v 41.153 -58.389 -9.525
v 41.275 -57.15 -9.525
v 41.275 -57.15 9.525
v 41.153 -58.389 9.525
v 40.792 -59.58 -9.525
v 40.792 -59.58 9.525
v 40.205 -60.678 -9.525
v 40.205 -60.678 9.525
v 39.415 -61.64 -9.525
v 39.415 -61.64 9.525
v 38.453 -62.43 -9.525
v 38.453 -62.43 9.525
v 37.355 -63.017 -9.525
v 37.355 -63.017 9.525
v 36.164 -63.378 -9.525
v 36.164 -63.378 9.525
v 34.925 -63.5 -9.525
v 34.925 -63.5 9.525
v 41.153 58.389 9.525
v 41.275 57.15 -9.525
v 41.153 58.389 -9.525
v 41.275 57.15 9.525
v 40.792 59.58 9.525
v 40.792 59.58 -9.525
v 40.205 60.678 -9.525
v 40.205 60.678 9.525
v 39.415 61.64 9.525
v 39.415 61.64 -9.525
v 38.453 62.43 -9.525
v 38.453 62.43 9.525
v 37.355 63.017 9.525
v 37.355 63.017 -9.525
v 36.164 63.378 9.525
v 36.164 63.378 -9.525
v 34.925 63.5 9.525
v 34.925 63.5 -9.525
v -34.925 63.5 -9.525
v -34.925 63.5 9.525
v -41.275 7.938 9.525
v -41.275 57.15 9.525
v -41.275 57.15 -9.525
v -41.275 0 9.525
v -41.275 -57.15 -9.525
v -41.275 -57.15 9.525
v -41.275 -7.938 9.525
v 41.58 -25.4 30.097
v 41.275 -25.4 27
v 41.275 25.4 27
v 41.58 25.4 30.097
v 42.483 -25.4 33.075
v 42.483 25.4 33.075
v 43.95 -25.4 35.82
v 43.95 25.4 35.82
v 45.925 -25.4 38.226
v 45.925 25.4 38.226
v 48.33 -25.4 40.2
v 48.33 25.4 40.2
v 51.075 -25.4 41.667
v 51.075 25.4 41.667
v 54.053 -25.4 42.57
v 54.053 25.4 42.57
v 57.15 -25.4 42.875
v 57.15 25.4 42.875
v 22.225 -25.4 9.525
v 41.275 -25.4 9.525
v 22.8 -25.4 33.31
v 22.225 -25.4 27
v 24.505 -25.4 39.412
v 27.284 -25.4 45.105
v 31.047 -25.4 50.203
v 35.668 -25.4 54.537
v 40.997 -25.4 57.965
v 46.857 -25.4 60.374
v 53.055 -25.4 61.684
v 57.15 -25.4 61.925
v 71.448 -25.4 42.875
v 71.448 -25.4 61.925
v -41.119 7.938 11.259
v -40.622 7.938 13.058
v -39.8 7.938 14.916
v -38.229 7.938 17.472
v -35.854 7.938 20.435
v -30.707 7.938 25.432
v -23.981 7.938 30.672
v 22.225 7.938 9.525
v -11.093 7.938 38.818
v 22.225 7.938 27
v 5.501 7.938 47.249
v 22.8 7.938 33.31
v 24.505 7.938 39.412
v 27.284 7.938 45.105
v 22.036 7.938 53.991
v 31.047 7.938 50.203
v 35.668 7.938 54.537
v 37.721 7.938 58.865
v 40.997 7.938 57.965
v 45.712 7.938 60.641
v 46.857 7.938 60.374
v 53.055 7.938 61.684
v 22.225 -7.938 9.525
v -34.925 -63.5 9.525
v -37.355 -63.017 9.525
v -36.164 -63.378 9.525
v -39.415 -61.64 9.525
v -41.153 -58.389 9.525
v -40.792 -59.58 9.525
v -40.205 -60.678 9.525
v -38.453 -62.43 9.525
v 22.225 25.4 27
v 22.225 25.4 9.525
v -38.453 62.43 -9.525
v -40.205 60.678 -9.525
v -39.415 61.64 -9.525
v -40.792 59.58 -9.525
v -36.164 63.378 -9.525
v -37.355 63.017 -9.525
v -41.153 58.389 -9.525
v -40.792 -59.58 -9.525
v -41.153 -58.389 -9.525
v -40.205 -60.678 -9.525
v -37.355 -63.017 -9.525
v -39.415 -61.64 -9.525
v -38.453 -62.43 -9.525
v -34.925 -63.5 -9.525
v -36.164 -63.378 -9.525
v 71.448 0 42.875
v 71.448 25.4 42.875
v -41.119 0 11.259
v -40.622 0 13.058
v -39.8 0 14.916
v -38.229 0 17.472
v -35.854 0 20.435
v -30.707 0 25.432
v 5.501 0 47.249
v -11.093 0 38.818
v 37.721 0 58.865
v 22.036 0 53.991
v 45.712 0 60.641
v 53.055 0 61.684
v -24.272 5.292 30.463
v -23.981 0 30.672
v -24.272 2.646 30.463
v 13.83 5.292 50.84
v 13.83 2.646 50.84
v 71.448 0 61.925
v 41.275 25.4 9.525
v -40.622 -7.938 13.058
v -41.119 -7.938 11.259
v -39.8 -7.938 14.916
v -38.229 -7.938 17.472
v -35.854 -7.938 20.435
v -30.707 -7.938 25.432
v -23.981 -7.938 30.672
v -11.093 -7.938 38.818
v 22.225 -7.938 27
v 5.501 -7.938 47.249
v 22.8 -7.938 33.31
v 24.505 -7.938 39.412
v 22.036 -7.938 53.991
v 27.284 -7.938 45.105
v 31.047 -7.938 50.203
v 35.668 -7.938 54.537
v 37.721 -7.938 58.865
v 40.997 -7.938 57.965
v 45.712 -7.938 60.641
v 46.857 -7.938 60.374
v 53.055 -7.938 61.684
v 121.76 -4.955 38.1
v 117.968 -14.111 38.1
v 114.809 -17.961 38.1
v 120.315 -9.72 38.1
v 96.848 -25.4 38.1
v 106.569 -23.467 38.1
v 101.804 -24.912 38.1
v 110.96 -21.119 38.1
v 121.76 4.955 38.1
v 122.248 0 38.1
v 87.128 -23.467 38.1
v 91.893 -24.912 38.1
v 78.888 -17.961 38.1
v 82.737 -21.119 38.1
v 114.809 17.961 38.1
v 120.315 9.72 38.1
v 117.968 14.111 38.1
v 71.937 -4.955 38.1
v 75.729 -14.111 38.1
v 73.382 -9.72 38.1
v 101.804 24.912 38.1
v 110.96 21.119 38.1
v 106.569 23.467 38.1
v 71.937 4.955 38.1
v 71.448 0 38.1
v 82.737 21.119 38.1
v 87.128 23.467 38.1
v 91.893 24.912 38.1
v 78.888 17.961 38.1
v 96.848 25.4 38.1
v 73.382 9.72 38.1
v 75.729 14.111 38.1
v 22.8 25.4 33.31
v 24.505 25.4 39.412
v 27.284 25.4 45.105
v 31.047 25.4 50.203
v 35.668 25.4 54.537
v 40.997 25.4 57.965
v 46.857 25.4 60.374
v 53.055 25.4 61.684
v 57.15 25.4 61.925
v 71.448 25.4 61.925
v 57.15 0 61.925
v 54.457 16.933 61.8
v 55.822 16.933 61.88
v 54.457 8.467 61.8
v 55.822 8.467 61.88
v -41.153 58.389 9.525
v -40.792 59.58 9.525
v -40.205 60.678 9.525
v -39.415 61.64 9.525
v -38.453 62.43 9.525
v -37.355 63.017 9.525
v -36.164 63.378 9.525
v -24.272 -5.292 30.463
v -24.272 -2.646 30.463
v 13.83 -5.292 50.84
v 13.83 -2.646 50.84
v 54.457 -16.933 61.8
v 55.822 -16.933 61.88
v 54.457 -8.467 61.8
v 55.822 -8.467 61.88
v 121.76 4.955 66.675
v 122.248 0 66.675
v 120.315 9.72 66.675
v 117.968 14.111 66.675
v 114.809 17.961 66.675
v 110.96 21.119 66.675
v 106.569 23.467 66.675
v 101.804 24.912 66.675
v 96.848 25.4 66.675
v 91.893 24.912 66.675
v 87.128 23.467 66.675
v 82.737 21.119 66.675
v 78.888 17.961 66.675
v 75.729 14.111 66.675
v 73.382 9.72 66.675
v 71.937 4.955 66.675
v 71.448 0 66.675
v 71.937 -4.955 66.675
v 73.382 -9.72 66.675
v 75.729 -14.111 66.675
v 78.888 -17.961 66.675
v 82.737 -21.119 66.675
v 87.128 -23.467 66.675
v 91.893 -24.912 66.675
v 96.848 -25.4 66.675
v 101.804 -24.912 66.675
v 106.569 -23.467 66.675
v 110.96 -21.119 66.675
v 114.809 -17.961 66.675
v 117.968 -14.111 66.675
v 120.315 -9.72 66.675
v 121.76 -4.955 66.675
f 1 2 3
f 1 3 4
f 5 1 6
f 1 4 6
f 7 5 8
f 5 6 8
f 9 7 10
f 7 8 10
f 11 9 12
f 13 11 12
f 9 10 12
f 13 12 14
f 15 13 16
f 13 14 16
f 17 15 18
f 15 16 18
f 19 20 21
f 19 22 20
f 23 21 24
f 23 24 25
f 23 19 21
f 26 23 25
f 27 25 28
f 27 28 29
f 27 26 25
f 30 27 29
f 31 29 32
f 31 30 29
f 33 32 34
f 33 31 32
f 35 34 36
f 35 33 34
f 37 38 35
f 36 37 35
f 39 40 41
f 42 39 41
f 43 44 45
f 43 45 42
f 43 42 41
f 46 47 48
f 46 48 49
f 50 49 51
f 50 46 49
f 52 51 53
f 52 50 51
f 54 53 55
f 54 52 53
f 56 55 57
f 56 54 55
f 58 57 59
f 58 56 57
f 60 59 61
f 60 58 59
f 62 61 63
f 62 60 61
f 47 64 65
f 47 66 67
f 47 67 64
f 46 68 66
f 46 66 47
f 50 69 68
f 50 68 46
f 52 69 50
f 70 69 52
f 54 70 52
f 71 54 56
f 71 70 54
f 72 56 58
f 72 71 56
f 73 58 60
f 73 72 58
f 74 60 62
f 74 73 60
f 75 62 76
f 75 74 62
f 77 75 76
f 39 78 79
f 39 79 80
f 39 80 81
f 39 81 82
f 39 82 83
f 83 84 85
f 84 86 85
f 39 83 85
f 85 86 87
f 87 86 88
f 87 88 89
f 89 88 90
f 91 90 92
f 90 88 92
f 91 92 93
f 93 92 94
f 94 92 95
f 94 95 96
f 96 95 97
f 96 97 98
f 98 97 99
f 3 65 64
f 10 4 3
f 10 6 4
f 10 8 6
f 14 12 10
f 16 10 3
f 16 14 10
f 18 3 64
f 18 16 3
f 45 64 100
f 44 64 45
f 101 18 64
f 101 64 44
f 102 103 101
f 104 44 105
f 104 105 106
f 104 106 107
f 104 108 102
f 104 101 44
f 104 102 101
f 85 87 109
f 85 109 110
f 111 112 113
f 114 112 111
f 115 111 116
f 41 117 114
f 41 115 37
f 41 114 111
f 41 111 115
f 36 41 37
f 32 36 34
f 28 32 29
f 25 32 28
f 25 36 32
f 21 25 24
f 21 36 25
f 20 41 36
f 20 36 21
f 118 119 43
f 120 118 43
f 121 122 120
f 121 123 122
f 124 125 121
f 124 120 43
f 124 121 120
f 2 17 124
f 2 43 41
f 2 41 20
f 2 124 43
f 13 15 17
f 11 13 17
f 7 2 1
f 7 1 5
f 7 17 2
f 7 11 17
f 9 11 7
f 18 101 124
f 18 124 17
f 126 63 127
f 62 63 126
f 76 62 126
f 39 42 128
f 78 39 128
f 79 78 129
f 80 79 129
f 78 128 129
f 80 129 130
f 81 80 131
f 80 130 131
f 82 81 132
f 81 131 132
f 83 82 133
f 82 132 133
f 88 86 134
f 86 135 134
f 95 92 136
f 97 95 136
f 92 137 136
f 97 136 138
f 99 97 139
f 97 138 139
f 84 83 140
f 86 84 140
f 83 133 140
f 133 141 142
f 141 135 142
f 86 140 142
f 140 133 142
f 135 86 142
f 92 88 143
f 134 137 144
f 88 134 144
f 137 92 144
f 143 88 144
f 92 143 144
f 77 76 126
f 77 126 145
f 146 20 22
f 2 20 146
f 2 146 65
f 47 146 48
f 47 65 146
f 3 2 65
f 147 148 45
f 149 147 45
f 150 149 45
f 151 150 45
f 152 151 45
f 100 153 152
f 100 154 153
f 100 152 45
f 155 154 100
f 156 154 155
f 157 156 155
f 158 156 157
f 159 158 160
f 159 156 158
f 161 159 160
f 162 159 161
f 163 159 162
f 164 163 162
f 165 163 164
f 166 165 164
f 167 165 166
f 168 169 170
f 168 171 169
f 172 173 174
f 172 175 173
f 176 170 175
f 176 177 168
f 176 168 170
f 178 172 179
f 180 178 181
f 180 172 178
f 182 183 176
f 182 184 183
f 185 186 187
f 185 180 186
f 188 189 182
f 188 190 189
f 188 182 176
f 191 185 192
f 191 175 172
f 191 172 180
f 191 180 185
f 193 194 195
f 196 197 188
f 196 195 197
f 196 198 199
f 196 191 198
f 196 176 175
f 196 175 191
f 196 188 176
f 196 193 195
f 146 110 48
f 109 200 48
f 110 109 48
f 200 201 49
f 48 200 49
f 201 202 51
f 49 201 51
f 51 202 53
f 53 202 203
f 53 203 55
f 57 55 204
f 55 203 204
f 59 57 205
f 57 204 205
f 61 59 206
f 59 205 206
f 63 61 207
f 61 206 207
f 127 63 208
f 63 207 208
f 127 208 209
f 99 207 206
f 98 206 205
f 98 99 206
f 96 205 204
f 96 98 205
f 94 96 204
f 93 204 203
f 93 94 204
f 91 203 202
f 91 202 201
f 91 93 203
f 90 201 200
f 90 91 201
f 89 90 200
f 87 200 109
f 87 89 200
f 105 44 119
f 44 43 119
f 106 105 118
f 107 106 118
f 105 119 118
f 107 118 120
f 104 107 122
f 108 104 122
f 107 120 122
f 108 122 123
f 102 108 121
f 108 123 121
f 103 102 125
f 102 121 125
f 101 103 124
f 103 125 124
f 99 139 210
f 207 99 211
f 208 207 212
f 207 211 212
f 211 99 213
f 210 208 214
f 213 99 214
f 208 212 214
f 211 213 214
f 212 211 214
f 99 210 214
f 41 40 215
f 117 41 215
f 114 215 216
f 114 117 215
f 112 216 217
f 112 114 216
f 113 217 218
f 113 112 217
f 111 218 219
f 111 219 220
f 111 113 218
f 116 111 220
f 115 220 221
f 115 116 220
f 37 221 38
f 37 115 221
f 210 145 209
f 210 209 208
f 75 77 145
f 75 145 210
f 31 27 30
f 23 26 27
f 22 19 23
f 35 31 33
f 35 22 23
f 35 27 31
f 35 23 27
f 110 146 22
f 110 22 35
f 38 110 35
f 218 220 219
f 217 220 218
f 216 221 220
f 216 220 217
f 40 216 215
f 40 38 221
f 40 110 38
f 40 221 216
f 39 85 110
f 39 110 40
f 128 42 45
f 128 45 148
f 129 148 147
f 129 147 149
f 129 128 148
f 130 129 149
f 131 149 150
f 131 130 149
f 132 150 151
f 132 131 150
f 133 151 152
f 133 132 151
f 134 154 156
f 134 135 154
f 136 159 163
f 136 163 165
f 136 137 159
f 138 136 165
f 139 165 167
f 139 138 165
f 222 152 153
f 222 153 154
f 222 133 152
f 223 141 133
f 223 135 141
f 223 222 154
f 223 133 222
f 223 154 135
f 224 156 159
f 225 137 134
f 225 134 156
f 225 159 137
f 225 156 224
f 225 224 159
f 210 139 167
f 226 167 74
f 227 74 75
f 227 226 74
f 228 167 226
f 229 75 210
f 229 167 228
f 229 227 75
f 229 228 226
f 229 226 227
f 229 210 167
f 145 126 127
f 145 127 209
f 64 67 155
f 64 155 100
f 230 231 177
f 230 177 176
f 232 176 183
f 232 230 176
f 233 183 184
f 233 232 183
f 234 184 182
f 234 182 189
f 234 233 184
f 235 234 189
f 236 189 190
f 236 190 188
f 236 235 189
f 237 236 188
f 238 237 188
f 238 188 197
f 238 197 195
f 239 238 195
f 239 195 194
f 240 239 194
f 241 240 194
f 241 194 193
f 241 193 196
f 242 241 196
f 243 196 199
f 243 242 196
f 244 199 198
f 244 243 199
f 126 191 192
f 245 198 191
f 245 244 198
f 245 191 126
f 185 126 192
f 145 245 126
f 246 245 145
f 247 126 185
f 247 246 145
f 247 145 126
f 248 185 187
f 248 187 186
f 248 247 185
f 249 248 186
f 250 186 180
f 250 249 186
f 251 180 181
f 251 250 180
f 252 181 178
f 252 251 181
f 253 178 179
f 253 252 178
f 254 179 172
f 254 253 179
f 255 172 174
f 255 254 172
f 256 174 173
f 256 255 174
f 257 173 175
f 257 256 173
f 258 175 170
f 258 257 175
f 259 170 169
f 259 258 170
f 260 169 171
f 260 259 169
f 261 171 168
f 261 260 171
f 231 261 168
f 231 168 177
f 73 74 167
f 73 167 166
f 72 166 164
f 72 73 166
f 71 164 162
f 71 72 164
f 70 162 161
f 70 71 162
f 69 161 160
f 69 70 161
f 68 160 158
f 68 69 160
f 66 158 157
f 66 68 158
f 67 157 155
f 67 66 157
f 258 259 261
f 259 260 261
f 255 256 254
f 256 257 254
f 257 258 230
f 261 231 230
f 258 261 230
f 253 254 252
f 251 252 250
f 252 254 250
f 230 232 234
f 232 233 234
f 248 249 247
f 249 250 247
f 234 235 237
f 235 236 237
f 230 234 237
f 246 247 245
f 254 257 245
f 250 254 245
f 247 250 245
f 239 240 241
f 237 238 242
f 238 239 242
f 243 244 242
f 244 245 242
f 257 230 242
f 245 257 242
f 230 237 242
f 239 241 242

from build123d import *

# Parameters (mm, degrees)
F1_DEPTH = 63.5
F2_DEPTH = 25.4
F3_DEPTH = 7.9375
F0_W     = 25.4
F0_H     = 28.575
F5_R     = 6.35


with BuildPart() as f1:
    # F0 (on Front) → F1 (new body, symmetric)
    with BuildSketch(Plane.XZ):
        Polygon((41.275, -9.525), (41.275, 9.525), (22.225, 9.525), (-41.275, 9.525), (-41.275, -9.525), align=None)
    extrude(amount=F1_DEPTH, both=True)

    # F0 (on Front) → F2 (join, symmetric)
    with BuildSketch(Plane.XZ):
        with BuildLine():
            Line((22.225, 9.525), (41.275, 9.525))
            Line((41.275, 9.525), (41.275, 27.0002))
            ThreePointArc((41.275, 27.0002), (45.92468, 38.22552), (57.15, 42.8752))
            Line((57.15, 42.8752), (71.44845, 42.8752))
            Line((71.44845, 42.8752), (71.44845, 61.9252))
            Line((71.44845, 61.9252), (57.15, 61.9252))
            add(Edge.make_bspline(
                [(53.055411, 61.684346), (54.474528, 61.816621), (55.841747, 61.897964), (57.15, 61.9252)],
                knots=[106.924111, 106.924111, 106.924111, 106.924111, 111.504536, 111.504536, 111.504536, 111.504536], degree=3))
            ThreePointArc((53.055411, 61.684346), (31.046752, 50.203132), (22.225, 27.0002))
            Line((22.225, 27.0002), (22.225, 9.525))
        make_face()
    extrude(amount=F2_DEPTH, both=True)

    # F0 (on Front) → F3 (join, symmetric)
    with BuildSketch(Plane.XZ):
        with BuildLine():
            Line((-41.275, 9.525), (22.225, 9.525))
            Line((22.225, 9.525), (22.225, 27.0002))
            ThreePointArc((22.225, 27.0002), (31.046752, 50.203132), (53.055411, 61.684346))
            add(Edge.make_bspline(
                [(-41.275, 9.525), (-41.480782, 27.753968), (19.927938, 58.596546), (53.055411, 61.684346)],
                knots=[0, 0, 0, 0, 106.924111, 106.924111, 106.924111, 106.924111], degree=3))
        make_face()
    extrude(amount=F3_DEPTH, both=True)

    # F0 (on Front) → F4 (revolve)
    with BuildSketch(Plane.XZ):
        with Locations((109.54845, 52.3875)):
            Rectangle(F0_W, F0_H)
    revolve(axis=Axis((96.84845, 0, 52.3875), (0, 0, 1)))

    # F5
    f5_edges = [f1.edges().sort_by_distance(p)[0] for p in [
        (-41.275, -63.5, 0),
        (41.275, -63.5, 0),
        (41.275, 63.5, 0),
        (-41.275, 63.5, 0),
    ]]
    fillet(f5_edges, radius=F5_R)


solid = f1.part
